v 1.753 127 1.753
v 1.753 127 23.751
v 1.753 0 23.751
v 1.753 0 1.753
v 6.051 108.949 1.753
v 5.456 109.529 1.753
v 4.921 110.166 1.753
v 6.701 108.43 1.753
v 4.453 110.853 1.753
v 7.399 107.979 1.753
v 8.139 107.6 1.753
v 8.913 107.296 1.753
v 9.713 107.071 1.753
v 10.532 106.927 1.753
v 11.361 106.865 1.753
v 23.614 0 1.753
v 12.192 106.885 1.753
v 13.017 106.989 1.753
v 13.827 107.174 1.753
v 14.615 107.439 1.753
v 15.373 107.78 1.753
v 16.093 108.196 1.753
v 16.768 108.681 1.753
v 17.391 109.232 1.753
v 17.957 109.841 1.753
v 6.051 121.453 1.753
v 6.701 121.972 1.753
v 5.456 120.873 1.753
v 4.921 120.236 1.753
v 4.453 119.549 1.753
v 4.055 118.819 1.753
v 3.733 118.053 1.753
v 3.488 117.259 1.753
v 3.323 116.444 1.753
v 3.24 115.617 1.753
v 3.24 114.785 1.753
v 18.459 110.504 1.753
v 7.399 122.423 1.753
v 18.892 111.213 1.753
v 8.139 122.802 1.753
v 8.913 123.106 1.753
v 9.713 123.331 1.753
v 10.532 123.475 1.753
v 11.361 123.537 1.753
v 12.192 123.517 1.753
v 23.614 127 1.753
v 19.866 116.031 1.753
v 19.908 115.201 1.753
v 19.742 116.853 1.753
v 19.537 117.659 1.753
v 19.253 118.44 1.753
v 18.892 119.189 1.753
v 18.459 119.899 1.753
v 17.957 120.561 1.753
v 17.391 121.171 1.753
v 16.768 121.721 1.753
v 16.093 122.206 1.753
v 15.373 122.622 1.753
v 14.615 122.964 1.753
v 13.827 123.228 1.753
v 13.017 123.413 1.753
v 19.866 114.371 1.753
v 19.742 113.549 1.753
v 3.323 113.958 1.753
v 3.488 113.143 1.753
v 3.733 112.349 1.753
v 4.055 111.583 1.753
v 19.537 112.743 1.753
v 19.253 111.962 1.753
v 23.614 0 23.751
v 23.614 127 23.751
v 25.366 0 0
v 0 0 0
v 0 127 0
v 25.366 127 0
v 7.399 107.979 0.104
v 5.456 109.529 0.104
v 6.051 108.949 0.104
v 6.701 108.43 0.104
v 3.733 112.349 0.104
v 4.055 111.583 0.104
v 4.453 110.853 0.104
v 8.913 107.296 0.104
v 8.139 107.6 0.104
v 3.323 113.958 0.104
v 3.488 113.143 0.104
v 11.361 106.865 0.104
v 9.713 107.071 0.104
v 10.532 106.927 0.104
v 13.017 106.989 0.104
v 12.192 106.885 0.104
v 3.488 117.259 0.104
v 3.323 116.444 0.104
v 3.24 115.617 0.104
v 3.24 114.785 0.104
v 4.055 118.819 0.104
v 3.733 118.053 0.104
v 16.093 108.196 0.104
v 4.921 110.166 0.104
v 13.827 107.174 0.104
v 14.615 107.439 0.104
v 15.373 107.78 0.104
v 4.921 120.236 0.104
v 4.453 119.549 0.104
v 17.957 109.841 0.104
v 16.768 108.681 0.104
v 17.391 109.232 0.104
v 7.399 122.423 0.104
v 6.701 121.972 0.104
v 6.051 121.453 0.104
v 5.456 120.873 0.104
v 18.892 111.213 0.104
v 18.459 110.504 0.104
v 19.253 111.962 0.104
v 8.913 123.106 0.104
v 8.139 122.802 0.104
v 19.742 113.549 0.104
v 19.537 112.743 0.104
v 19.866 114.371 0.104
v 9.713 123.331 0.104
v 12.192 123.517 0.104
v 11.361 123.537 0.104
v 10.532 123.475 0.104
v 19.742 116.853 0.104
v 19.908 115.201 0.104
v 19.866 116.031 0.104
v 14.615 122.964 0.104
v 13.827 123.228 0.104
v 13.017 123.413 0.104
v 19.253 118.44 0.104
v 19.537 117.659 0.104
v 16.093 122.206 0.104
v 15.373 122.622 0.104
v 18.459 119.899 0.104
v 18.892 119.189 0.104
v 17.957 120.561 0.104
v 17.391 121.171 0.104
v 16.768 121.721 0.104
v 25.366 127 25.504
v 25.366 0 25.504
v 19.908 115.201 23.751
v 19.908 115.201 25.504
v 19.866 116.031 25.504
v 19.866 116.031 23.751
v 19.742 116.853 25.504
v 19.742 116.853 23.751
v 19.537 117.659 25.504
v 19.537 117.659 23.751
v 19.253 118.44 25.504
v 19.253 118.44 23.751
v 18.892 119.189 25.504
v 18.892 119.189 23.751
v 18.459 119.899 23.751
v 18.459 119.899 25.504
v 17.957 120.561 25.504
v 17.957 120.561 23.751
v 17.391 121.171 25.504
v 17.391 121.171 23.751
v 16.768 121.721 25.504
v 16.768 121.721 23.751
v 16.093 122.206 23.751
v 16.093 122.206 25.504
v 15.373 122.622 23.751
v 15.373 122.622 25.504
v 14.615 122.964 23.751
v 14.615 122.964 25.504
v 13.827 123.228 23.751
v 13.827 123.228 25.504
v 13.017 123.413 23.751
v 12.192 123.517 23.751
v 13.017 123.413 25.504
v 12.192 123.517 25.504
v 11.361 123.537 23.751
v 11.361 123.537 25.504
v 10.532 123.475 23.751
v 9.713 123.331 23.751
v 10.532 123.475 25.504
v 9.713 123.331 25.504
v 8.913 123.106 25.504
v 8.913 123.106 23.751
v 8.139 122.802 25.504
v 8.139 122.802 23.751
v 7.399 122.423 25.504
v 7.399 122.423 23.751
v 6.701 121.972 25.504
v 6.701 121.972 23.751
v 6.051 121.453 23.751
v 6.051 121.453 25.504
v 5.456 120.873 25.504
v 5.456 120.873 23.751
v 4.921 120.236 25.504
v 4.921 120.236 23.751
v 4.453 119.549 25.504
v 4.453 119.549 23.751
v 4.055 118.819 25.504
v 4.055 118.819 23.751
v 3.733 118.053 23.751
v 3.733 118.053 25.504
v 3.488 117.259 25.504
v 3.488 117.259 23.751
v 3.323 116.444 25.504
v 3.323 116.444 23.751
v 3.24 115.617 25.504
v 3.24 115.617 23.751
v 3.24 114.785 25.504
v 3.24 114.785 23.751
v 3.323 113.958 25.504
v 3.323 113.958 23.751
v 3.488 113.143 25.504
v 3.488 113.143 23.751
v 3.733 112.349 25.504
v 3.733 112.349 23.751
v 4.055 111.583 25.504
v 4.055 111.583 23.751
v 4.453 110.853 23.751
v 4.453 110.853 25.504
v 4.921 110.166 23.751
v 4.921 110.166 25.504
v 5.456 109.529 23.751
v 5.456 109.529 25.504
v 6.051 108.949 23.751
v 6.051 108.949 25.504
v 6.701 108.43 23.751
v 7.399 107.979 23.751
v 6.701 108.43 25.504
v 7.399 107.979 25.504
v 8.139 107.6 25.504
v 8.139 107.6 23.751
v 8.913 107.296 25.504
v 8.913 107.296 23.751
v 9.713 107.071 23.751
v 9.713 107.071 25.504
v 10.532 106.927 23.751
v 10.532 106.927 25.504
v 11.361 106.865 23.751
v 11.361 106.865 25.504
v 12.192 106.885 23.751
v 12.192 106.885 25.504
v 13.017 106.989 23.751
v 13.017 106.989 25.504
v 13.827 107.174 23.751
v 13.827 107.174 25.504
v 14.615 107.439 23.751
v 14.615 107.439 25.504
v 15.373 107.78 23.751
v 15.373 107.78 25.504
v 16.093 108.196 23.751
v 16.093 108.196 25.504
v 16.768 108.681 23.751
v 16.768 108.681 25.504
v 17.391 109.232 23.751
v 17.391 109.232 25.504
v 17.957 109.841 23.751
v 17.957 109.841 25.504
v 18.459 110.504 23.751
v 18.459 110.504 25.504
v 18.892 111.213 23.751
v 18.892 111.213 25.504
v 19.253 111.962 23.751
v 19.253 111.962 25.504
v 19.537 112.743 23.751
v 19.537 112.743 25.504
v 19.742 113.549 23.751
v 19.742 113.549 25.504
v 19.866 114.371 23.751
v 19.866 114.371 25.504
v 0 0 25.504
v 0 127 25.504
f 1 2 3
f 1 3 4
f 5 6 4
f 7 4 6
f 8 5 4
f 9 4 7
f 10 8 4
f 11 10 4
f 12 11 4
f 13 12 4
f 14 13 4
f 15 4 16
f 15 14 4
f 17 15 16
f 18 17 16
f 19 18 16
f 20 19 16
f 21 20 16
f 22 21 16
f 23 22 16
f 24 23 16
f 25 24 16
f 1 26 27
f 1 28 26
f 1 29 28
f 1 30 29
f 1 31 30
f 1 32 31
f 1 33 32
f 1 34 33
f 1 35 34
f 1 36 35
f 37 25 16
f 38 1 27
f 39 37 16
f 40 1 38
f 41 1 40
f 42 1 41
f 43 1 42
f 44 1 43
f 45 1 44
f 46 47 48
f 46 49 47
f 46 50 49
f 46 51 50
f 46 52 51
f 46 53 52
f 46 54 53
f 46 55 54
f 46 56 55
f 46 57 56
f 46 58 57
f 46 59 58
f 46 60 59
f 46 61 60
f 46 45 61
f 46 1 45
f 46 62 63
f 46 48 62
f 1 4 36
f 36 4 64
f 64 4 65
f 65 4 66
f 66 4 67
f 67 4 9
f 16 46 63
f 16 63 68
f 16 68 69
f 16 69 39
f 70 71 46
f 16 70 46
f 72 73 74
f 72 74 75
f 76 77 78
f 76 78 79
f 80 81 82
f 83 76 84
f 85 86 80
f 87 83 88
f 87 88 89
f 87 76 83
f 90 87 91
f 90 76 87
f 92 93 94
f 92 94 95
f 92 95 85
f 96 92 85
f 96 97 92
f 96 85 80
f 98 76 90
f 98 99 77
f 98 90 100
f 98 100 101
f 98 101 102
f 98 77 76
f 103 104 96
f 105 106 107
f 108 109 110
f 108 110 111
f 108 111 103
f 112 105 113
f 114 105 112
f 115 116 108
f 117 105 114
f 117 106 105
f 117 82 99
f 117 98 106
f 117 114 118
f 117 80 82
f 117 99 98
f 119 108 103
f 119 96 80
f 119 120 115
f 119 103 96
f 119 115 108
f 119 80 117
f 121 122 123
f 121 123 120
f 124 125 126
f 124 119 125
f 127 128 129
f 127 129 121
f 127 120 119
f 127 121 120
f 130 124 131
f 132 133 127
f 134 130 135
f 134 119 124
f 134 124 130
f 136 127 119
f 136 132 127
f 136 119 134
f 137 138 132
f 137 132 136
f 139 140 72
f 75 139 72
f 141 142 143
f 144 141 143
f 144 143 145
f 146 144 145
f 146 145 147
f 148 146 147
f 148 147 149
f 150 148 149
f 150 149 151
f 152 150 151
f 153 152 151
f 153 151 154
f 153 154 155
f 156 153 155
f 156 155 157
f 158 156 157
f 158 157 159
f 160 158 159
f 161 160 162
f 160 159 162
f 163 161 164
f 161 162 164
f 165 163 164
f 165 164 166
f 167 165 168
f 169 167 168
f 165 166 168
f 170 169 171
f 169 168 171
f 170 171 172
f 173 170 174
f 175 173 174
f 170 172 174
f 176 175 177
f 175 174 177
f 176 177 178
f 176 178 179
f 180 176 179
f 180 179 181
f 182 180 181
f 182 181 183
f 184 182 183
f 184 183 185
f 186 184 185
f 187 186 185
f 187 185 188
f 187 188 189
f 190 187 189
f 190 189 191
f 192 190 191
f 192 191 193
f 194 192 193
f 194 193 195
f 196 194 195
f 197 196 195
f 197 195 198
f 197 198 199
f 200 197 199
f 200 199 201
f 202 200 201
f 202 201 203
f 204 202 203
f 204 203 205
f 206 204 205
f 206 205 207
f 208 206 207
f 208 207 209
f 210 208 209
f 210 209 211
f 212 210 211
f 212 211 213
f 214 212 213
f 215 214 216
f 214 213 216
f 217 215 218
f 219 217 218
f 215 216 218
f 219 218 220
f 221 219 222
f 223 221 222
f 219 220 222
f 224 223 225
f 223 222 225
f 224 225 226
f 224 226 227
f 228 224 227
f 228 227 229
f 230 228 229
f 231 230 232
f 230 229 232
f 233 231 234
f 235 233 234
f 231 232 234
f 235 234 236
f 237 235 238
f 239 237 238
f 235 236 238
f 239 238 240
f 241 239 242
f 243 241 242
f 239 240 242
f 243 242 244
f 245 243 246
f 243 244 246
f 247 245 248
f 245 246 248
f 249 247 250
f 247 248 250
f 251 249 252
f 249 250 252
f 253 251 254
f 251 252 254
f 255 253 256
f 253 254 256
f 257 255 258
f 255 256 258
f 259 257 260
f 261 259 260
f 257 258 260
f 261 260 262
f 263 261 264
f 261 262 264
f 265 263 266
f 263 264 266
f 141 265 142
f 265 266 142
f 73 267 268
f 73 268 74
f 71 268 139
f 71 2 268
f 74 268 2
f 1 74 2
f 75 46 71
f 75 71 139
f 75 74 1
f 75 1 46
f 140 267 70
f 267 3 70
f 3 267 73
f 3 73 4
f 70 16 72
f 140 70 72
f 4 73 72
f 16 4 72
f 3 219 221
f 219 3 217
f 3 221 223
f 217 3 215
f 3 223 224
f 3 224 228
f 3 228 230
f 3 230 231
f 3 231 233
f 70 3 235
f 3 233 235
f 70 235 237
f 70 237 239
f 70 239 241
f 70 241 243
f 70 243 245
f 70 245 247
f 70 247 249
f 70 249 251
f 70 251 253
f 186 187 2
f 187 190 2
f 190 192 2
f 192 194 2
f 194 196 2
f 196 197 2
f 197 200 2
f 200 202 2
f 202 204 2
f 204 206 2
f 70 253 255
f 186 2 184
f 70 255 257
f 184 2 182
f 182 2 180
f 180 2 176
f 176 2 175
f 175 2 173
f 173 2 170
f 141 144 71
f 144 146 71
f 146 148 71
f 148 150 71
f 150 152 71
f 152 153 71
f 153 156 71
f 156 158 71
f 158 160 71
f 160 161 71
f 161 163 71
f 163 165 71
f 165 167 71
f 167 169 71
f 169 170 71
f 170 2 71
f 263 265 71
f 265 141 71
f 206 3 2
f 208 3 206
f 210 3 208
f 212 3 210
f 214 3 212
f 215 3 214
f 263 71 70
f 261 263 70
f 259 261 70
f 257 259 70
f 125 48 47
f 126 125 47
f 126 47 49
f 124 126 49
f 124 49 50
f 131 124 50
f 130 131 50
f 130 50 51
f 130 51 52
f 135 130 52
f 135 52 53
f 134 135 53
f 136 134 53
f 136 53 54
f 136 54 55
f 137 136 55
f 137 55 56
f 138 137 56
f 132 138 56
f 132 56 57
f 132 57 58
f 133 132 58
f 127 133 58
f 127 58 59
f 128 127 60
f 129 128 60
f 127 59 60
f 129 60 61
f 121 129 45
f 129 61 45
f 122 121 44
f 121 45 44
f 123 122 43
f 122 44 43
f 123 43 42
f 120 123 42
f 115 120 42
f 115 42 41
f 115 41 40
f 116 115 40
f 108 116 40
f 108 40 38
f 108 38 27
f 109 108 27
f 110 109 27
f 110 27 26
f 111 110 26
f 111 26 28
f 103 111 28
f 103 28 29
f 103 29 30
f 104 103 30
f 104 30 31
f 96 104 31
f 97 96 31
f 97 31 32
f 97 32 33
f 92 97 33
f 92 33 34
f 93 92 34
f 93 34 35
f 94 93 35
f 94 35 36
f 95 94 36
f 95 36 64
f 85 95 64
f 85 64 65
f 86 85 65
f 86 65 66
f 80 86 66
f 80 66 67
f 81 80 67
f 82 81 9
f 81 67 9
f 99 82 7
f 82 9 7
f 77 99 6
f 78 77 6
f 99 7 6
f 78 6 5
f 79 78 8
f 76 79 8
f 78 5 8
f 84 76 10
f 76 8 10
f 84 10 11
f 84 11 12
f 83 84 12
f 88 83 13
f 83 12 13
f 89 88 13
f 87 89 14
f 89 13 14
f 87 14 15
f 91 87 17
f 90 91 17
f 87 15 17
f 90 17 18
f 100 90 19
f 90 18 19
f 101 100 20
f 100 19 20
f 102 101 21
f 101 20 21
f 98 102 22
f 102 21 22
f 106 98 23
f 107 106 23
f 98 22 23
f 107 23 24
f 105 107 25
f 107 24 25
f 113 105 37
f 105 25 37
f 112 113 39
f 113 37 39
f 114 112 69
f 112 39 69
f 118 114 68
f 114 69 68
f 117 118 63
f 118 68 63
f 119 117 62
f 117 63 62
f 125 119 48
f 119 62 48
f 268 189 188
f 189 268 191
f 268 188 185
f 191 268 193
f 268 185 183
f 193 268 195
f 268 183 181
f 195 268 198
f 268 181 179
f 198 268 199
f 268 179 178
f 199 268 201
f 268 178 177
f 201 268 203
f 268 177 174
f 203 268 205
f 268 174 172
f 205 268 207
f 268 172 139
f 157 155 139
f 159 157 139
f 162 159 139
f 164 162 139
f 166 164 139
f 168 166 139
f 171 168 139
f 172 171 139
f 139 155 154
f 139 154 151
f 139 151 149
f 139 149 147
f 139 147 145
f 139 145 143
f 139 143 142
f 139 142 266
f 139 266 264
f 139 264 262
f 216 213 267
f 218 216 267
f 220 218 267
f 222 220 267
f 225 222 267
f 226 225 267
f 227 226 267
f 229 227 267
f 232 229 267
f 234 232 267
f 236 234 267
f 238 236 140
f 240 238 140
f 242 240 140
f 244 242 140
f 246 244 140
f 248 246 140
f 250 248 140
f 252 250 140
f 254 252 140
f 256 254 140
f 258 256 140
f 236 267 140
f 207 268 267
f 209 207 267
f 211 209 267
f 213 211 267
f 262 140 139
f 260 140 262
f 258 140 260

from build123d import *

# Parameters (mm, degrees)
SKETCH1_W           = 25.366424343
SKETCH1_H           = 25.503811798
BOSS_EXTRUDE1_DEPTH = 127
SKETCH2_R           = 8.338941436
CUT_EXTRUDE1_DEPTH  = 25.4
SKETCH3_W           = 21.861224343
SKETCH3_H           = 21.998611798
CUT_EXTRUDE2_DEPTH  = 127


with BuildPart() as part:
    # Sketch1 → Boss-Extrude1 (new body)
    with BuildSketch(Plane(origin=(0, 0, 0), x_dir=(1, 0, 0), z_dir=(0, 1, 0))):
        with Locations((12.683212172, -12.751905899)):
            Rectangle(SKETCH1_W, SKETCH1_H)
    extrude(amount=BOSS_EXTRUDE1_DEPTH)

    # Sketch2 → Cut-Extrude1 (cut)
    with BuildSketch(Plane.XY.offset(25.503811798)):
        with Locations((11.568608199, 115.201083313)):
            Circle(SKETCH2_R)
    extrude(amount=-CUT_EXTRUDE1_DEPTH, mode=Mode.SUBTRACT)

    # Sketch3 → Cut-Extrude2 (cut)
    with BuildSketch(Plane(origin=(0, 127, 0), x_dir=(1, 0, 0), z_dir=(0, 1, 0))):
        with Locations((12.683212172, -12.751905899)):
            Rectangle(SKETCH3_W, SKETCH3_H)
    extrude(amount=-CUT_EXTRUDE2_DEPTH, mode=Mode.SUBTRACT)


solid = part.part
